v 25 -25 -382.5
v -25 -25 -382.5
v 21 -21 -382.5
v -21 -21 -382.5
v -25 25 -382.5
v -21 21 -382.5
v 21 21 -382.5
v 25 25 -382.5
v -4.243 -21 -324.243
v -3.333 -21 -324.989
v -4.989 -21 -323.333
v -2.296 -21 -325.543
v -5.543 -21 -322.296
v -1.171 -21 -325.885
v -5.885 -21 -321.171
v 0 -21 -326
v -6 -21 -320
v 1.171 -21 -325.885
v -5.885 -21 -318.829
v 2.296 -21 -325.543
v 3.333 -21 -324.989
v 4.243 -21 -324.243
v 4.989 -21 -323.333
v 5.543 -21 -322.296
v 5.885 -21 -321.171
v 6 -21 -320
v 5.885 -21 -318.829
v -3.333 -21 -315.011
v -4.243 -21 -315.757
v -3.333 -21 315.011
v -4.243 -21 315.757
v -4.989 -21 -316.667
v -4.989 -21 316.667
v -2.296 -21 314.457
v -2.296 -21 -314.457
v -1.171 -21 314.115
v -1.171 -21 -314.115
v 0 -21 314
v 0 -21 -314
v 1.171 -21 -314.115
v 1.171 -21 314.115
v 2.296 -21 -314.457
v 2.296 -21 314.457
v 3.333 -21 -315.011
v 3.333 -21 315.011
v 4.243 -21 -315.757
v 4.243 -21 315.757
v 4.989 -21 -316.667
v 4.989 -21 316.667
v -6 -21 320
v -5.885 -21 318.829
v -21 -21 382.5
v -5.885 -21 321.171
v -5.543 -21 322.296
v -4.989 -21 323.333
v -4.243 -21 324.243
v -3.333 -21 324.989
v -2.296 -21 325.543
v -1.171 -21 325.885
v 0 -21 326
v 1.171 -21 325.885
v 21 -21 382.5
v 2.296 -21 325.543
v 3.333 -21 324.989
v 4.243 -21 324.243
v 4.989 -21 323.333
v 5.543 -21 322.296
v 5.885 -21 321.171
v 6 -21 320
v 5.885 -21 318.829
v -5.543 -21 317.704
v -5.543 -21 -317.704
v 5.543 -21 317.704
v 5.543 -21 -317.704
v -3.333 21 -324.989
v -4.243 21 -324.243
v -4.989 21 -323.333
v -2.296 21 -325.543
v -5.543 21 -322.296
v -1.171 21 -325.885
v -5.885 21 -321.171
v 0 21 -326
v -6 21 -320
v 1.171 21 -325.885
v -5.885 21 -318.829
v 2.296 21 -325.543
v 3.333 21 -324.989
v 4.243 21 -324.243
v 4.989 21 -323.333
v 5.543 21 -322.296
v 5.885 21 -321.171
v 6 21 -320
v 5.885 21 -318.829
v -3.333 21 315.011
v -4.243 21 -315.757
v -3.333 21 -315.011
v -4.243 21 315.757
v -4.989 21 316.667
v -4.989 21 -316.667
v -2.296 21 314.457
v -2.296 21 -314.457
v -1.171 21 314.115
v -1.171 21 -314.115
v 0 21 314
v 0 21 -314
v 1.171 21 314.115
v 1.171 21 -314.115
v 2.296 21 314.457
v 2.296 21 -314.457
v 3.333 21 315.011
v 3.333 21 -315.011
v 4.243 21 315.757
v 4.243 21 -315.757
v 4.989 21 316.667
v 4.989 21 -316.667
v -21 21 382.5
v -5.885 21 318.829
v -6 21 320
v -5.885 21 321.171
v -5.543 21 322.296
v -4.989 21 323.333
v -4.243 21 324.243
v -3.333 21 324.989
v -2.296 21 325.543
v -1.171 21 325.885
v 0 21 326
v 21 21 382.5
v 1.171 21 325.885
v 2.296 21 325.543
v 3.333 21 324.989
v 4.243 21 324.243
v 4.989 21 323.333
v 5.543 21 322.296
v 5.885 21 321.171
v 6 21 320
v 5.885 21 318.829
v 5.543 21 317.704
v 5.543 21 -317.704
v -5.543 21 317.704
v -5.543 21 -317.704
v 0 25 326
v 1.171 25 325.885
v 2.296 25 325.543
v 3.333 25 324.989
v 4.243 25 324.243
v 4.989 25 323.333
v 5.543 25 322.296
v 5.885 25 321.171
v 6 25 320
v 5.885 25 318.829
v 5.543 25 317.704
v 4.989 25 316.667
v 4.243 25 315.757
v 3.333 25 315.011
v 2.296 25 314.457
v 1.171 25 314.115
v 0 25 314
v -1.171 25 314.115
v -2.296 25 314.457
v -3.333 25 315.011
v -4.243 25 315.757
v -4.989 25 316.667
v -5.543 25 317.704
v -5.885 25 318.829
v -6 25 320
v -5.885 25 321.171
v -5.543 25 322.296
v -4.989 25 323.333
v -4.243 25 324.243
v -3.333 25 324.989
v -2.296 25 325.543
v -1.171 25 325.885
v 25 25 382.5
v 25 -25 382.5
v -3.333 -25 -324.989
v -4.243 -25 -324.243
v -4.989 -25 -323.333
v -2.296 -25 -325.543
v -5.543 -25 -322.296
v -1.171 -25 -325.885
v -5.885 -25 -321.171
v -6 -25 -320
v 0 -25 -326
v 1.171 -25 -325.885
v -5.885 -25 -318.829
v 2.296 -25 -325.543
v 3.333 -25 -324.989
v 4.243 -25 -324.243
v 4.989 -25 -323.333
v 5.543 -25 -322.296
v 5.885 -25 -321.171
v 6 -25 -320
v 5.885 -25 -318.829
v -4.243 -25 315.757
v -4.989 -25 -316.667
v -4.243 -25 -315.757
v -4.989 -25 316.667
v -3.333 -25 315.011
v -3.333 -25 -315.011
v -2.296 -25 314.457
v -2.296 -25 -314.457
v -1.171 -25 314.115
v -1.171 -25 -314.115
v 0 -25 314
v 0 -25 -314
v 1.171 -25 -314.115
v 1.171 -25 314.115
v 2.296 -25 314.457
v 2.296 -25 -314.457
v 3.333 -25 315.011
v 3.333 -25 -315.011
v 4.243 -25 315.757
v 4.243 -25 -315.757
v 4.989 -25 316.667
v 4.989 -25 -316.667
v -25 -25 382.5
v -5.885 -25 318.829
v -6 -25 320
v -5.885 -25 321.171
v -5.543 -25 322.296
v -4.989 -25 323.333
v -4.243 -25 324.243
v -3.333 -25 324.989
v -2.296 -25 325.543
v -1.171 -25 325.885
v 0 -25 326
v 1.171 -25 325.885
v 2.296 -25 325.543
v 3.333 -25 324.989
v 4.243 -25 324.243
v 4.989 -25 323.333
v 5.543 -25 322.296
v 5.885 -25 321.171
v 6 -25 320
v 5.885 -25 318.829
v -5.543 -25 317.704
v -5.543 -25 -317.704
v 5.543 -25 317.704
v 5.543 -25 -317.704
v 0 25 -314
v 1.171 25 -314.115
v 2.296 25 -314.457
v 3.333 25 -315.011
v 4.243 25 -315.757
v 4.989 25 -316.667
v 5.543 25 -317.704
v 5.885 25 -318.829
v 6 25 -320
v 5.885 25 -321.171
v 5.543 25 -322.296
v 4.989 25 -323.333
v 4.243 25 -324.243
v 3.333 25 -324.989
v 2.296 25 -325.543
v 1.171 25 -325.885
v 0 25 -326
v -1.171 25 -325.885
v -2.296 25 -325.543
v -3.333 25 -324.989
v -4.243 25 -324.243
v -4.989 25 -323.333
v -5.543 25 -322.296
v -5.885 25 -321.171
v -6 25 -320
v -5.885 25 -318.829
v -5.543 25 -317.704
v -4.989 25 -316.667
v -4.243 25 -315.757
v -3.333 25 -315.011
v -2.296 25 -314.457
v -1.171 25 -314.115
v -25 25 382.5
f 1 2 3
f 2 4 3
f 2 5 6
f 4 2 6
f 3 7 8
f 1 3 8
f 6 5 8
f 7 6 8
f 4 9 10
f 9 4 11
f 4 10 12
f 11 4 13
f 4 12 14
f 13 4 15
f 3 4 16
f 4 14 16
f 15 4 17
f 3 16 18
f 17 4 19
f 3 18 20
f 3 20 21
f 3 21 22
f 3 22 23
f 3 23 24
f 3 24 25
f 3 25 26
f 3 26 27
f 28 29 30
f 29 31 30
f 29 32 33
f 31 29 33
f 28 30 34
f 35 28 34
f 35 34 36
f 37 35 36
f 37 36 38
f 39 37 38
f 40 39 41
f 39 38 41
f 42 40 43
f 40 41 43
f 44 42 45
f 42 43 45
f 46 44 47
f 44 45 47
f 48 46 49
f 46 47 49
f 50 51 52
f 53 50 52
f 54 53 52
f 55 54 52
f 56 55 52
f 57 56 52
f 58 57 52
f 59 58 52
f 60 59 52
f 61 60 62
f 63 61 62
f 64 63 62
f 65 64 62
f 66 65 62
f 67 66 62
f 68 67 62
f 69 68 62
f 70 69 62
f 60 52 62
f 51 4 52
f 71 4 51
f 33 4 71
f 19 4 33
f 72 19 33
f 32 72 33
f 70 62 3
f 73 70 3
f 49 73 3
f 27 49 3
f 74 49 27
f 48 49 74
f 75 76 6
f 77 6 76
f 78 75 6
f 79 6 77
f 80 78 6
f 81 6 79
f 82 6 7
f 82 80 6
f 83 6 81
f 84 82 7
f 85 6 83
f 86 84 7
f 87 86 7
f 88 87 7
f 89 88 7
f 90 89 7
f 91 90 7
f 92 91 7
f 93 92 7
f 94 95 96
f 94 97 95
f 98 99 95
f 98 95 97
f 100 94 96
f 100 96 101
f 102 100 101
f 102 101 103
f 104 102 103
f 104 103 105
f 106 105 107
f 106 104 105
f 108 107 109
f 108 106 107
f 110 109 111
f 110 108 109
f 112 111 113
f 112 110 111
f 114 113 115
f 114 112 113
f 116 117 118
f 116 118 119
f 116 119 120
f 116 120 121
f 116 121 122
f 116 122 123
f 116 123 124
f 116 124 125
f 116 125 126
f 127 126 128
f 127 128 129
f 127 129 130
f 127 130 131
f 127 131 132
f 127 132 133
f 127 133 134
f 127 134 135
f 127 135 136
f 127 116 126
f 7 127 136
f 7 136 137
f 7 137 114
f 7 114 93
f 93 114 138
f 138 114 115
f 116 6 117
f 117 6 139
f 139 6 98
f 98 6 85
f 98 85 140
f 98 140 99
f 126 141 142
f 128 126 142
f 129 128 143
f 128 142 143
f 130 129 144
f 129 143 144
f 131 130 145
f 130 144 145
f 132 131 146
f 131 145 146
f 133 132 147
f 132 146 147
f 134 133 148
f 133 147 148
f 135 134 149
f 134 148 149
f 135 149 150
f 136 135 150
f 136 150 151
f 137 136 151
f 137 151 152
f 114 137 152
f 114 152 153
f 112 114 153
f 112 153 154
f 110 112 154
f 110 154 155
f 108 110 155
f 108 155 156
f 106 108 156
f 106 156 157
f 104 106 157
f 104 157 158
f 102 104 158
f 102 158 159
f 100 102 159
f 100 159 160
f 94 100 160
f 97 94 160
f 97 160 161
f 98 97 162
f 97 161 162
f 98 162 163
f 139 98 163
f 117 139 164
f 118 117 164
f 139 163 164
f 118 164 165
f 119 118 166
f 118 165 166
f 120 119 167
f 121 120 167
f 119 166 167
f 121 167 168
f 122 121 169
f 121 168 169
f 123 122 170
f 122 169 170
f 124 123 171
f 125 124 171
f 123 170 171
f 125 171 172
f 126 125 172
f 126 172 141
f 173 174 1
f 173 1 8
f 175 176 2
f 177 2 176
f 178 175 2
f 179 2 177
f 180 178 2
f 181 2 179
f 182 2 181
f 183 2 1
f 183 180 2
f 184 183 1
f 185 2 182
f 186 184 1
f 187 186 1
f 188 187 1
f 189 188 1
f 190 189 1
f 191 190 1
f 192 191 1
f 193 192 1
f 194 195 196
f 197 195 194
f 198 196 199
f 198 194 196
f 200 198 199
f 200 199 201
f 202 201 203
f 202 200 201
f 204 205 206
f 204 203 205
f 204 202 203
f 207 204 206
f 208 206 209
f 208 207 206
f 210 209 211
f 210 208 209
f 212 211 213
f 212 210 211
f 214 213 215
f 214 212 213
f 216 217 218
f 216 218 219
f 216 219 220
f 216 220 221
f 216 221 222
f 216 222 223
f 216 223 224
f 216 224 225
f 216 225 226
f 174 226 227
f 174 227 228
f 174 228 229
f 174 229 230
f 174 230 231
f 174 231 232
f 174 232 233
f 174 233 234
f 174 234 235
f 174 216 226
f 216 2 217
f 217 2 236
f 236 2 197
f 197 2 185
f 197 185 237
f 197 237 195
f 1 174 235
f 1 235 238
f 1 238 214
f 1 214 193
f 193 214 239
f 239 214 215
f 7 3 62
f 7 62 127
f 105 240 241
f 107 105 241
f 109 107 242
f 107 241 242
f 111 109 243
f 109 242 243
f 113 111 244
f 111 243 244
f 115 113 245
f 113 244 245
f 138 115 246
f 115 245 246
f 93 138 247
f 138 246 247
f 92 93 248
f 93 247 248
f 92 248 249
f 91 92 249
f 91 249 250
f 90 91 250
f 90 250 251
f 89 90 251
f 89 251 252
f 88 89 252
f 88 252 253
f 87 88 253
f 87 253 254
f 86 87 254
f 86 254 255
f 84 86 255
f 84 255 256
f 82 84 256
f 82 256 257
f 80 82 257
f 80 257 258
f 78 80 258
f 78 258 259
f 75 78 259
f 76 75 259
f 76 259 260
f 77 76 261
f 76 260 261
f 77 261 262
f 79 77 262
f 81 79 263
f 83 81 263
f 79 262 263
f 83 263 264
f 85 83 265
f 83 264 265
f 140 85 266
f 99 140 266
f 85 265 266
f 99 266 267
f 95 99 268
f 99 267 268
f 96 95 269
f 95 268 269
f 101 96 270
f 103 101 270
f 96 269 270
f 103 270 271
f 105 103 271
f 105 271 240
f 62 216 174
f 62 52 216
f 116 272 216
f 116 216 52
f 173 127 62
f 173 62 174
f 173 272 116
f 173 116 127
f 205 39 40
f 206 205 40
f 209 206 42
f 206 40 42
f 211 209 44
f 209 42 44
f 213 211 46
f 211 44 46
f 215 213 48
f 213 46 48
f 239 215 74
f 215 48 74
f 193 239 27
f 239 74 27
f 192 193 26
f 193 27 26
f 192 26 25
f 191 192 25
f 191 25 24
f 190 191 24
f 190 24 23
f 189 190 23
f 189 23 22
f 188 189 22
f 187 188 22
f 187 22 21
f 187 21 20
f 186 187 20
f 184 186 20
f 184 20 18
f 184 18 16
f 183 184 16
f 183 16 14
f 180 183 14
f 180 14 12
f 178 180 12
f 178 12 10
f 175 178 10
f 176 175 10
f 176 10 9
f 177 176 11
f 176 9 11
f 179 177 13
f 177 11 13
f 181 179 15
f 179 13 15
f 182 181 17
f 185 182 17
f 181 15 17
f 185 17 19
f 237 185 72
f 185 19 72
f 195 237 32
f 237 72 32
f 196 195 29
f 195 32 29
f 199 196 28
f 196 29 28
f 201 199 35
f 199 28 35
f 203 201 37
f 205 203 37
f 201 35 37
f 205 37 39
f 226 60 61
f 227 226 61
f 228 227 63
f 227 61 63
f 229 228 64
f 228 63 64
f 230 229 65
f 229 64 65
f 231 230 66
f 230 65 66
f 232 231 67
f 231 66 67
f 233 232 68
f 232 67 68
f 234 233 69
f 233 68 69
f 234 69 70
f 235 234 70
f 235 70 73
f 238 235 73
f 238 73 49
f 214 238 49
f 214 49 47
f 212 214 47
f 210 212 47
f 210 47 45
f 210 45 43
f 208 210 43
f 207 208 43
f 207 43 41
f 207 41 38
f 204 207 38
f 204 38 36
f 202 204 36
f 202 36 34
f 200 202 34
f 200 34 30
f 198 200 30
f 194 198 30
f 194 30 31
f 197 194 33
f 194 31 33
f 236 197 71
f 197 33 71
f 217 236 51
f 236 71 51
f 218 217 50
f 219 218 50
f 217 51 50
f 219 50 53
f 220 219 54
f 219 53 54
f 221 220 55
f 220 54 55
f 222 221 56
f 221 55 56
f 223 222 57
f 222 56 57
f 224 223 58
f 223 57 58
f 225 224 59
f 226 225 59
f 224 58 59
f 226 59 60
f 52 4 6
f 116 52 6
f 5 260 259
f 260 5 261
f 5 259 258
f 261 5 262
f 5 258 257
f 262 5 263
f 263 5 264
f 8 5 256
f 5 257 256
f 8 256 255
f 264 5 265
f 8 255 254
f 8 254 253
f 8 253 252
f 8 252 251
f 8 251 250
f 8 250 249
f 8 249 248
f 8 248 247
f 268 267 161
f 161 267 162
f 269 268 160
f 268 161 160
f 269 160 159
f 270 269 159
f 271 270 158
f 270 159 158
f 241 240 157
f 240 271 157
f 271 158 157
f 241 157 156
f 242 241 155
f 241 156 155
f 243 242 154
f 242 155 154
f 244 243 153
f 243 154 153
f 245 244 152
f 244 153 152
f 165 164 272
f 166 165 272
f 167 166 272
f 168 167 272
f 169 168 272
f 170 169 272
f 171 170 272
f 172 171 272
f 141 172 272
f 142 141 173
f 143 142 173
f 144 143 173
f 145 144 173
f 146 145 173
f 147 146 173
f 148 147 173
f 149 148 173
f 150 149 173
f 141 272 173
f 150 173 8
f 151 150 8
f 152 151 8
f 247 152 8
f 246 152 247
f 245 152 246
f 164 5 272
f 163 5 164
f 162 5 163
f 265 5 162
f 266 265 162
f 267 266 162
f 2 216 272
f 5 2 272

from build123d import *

# Parameters (mm, degrees)
SKETCH_1_W          = 50
SKETCH_1_H          = 50
SKETCH_1_W_2        = 42
SKETCH_1_H_2        = 42
EXTRUDE_1_DEPTH     = 382.5
SKETCH_2_R          = 6
CUT_EXTRUDE_1_DEPTH = 387.563384195


with BuildPart() as part:
    # 草图1 → 凸台-拉伸1 (new, symmetric)
    with BuildSketch(Plane.XY):
        Rectangle(SKETCH_1_W, SKETCH_1_H)
        Rectangle(SKETCH_1_W_2, SKETCH_1_H_2, mode=Mode.SUBTRACT)
    extrude(amount=EXTRUDE_1_DEPTH, both=True)

    # 草图2 → 切除-拉伸1 (cut, through all)
    with BuildSketch(Plane(origin=(0, 25, 0), x_dir=(1, 0, 0), z_dir=(0, 1, 0))):
        with Locations(Location((0, 320, 0), (0, 0, 270))):
            Circle(SKETCH_2_R)
        with Locations(Location((0, -320, 0), (0, 0, 270))):
            Circle(SKETCH_2_R)
    extrude(amount=-CUT_EXTRUDE_1_DEPTH, mode=Mode.SUBTRACT)


solid = part.part
